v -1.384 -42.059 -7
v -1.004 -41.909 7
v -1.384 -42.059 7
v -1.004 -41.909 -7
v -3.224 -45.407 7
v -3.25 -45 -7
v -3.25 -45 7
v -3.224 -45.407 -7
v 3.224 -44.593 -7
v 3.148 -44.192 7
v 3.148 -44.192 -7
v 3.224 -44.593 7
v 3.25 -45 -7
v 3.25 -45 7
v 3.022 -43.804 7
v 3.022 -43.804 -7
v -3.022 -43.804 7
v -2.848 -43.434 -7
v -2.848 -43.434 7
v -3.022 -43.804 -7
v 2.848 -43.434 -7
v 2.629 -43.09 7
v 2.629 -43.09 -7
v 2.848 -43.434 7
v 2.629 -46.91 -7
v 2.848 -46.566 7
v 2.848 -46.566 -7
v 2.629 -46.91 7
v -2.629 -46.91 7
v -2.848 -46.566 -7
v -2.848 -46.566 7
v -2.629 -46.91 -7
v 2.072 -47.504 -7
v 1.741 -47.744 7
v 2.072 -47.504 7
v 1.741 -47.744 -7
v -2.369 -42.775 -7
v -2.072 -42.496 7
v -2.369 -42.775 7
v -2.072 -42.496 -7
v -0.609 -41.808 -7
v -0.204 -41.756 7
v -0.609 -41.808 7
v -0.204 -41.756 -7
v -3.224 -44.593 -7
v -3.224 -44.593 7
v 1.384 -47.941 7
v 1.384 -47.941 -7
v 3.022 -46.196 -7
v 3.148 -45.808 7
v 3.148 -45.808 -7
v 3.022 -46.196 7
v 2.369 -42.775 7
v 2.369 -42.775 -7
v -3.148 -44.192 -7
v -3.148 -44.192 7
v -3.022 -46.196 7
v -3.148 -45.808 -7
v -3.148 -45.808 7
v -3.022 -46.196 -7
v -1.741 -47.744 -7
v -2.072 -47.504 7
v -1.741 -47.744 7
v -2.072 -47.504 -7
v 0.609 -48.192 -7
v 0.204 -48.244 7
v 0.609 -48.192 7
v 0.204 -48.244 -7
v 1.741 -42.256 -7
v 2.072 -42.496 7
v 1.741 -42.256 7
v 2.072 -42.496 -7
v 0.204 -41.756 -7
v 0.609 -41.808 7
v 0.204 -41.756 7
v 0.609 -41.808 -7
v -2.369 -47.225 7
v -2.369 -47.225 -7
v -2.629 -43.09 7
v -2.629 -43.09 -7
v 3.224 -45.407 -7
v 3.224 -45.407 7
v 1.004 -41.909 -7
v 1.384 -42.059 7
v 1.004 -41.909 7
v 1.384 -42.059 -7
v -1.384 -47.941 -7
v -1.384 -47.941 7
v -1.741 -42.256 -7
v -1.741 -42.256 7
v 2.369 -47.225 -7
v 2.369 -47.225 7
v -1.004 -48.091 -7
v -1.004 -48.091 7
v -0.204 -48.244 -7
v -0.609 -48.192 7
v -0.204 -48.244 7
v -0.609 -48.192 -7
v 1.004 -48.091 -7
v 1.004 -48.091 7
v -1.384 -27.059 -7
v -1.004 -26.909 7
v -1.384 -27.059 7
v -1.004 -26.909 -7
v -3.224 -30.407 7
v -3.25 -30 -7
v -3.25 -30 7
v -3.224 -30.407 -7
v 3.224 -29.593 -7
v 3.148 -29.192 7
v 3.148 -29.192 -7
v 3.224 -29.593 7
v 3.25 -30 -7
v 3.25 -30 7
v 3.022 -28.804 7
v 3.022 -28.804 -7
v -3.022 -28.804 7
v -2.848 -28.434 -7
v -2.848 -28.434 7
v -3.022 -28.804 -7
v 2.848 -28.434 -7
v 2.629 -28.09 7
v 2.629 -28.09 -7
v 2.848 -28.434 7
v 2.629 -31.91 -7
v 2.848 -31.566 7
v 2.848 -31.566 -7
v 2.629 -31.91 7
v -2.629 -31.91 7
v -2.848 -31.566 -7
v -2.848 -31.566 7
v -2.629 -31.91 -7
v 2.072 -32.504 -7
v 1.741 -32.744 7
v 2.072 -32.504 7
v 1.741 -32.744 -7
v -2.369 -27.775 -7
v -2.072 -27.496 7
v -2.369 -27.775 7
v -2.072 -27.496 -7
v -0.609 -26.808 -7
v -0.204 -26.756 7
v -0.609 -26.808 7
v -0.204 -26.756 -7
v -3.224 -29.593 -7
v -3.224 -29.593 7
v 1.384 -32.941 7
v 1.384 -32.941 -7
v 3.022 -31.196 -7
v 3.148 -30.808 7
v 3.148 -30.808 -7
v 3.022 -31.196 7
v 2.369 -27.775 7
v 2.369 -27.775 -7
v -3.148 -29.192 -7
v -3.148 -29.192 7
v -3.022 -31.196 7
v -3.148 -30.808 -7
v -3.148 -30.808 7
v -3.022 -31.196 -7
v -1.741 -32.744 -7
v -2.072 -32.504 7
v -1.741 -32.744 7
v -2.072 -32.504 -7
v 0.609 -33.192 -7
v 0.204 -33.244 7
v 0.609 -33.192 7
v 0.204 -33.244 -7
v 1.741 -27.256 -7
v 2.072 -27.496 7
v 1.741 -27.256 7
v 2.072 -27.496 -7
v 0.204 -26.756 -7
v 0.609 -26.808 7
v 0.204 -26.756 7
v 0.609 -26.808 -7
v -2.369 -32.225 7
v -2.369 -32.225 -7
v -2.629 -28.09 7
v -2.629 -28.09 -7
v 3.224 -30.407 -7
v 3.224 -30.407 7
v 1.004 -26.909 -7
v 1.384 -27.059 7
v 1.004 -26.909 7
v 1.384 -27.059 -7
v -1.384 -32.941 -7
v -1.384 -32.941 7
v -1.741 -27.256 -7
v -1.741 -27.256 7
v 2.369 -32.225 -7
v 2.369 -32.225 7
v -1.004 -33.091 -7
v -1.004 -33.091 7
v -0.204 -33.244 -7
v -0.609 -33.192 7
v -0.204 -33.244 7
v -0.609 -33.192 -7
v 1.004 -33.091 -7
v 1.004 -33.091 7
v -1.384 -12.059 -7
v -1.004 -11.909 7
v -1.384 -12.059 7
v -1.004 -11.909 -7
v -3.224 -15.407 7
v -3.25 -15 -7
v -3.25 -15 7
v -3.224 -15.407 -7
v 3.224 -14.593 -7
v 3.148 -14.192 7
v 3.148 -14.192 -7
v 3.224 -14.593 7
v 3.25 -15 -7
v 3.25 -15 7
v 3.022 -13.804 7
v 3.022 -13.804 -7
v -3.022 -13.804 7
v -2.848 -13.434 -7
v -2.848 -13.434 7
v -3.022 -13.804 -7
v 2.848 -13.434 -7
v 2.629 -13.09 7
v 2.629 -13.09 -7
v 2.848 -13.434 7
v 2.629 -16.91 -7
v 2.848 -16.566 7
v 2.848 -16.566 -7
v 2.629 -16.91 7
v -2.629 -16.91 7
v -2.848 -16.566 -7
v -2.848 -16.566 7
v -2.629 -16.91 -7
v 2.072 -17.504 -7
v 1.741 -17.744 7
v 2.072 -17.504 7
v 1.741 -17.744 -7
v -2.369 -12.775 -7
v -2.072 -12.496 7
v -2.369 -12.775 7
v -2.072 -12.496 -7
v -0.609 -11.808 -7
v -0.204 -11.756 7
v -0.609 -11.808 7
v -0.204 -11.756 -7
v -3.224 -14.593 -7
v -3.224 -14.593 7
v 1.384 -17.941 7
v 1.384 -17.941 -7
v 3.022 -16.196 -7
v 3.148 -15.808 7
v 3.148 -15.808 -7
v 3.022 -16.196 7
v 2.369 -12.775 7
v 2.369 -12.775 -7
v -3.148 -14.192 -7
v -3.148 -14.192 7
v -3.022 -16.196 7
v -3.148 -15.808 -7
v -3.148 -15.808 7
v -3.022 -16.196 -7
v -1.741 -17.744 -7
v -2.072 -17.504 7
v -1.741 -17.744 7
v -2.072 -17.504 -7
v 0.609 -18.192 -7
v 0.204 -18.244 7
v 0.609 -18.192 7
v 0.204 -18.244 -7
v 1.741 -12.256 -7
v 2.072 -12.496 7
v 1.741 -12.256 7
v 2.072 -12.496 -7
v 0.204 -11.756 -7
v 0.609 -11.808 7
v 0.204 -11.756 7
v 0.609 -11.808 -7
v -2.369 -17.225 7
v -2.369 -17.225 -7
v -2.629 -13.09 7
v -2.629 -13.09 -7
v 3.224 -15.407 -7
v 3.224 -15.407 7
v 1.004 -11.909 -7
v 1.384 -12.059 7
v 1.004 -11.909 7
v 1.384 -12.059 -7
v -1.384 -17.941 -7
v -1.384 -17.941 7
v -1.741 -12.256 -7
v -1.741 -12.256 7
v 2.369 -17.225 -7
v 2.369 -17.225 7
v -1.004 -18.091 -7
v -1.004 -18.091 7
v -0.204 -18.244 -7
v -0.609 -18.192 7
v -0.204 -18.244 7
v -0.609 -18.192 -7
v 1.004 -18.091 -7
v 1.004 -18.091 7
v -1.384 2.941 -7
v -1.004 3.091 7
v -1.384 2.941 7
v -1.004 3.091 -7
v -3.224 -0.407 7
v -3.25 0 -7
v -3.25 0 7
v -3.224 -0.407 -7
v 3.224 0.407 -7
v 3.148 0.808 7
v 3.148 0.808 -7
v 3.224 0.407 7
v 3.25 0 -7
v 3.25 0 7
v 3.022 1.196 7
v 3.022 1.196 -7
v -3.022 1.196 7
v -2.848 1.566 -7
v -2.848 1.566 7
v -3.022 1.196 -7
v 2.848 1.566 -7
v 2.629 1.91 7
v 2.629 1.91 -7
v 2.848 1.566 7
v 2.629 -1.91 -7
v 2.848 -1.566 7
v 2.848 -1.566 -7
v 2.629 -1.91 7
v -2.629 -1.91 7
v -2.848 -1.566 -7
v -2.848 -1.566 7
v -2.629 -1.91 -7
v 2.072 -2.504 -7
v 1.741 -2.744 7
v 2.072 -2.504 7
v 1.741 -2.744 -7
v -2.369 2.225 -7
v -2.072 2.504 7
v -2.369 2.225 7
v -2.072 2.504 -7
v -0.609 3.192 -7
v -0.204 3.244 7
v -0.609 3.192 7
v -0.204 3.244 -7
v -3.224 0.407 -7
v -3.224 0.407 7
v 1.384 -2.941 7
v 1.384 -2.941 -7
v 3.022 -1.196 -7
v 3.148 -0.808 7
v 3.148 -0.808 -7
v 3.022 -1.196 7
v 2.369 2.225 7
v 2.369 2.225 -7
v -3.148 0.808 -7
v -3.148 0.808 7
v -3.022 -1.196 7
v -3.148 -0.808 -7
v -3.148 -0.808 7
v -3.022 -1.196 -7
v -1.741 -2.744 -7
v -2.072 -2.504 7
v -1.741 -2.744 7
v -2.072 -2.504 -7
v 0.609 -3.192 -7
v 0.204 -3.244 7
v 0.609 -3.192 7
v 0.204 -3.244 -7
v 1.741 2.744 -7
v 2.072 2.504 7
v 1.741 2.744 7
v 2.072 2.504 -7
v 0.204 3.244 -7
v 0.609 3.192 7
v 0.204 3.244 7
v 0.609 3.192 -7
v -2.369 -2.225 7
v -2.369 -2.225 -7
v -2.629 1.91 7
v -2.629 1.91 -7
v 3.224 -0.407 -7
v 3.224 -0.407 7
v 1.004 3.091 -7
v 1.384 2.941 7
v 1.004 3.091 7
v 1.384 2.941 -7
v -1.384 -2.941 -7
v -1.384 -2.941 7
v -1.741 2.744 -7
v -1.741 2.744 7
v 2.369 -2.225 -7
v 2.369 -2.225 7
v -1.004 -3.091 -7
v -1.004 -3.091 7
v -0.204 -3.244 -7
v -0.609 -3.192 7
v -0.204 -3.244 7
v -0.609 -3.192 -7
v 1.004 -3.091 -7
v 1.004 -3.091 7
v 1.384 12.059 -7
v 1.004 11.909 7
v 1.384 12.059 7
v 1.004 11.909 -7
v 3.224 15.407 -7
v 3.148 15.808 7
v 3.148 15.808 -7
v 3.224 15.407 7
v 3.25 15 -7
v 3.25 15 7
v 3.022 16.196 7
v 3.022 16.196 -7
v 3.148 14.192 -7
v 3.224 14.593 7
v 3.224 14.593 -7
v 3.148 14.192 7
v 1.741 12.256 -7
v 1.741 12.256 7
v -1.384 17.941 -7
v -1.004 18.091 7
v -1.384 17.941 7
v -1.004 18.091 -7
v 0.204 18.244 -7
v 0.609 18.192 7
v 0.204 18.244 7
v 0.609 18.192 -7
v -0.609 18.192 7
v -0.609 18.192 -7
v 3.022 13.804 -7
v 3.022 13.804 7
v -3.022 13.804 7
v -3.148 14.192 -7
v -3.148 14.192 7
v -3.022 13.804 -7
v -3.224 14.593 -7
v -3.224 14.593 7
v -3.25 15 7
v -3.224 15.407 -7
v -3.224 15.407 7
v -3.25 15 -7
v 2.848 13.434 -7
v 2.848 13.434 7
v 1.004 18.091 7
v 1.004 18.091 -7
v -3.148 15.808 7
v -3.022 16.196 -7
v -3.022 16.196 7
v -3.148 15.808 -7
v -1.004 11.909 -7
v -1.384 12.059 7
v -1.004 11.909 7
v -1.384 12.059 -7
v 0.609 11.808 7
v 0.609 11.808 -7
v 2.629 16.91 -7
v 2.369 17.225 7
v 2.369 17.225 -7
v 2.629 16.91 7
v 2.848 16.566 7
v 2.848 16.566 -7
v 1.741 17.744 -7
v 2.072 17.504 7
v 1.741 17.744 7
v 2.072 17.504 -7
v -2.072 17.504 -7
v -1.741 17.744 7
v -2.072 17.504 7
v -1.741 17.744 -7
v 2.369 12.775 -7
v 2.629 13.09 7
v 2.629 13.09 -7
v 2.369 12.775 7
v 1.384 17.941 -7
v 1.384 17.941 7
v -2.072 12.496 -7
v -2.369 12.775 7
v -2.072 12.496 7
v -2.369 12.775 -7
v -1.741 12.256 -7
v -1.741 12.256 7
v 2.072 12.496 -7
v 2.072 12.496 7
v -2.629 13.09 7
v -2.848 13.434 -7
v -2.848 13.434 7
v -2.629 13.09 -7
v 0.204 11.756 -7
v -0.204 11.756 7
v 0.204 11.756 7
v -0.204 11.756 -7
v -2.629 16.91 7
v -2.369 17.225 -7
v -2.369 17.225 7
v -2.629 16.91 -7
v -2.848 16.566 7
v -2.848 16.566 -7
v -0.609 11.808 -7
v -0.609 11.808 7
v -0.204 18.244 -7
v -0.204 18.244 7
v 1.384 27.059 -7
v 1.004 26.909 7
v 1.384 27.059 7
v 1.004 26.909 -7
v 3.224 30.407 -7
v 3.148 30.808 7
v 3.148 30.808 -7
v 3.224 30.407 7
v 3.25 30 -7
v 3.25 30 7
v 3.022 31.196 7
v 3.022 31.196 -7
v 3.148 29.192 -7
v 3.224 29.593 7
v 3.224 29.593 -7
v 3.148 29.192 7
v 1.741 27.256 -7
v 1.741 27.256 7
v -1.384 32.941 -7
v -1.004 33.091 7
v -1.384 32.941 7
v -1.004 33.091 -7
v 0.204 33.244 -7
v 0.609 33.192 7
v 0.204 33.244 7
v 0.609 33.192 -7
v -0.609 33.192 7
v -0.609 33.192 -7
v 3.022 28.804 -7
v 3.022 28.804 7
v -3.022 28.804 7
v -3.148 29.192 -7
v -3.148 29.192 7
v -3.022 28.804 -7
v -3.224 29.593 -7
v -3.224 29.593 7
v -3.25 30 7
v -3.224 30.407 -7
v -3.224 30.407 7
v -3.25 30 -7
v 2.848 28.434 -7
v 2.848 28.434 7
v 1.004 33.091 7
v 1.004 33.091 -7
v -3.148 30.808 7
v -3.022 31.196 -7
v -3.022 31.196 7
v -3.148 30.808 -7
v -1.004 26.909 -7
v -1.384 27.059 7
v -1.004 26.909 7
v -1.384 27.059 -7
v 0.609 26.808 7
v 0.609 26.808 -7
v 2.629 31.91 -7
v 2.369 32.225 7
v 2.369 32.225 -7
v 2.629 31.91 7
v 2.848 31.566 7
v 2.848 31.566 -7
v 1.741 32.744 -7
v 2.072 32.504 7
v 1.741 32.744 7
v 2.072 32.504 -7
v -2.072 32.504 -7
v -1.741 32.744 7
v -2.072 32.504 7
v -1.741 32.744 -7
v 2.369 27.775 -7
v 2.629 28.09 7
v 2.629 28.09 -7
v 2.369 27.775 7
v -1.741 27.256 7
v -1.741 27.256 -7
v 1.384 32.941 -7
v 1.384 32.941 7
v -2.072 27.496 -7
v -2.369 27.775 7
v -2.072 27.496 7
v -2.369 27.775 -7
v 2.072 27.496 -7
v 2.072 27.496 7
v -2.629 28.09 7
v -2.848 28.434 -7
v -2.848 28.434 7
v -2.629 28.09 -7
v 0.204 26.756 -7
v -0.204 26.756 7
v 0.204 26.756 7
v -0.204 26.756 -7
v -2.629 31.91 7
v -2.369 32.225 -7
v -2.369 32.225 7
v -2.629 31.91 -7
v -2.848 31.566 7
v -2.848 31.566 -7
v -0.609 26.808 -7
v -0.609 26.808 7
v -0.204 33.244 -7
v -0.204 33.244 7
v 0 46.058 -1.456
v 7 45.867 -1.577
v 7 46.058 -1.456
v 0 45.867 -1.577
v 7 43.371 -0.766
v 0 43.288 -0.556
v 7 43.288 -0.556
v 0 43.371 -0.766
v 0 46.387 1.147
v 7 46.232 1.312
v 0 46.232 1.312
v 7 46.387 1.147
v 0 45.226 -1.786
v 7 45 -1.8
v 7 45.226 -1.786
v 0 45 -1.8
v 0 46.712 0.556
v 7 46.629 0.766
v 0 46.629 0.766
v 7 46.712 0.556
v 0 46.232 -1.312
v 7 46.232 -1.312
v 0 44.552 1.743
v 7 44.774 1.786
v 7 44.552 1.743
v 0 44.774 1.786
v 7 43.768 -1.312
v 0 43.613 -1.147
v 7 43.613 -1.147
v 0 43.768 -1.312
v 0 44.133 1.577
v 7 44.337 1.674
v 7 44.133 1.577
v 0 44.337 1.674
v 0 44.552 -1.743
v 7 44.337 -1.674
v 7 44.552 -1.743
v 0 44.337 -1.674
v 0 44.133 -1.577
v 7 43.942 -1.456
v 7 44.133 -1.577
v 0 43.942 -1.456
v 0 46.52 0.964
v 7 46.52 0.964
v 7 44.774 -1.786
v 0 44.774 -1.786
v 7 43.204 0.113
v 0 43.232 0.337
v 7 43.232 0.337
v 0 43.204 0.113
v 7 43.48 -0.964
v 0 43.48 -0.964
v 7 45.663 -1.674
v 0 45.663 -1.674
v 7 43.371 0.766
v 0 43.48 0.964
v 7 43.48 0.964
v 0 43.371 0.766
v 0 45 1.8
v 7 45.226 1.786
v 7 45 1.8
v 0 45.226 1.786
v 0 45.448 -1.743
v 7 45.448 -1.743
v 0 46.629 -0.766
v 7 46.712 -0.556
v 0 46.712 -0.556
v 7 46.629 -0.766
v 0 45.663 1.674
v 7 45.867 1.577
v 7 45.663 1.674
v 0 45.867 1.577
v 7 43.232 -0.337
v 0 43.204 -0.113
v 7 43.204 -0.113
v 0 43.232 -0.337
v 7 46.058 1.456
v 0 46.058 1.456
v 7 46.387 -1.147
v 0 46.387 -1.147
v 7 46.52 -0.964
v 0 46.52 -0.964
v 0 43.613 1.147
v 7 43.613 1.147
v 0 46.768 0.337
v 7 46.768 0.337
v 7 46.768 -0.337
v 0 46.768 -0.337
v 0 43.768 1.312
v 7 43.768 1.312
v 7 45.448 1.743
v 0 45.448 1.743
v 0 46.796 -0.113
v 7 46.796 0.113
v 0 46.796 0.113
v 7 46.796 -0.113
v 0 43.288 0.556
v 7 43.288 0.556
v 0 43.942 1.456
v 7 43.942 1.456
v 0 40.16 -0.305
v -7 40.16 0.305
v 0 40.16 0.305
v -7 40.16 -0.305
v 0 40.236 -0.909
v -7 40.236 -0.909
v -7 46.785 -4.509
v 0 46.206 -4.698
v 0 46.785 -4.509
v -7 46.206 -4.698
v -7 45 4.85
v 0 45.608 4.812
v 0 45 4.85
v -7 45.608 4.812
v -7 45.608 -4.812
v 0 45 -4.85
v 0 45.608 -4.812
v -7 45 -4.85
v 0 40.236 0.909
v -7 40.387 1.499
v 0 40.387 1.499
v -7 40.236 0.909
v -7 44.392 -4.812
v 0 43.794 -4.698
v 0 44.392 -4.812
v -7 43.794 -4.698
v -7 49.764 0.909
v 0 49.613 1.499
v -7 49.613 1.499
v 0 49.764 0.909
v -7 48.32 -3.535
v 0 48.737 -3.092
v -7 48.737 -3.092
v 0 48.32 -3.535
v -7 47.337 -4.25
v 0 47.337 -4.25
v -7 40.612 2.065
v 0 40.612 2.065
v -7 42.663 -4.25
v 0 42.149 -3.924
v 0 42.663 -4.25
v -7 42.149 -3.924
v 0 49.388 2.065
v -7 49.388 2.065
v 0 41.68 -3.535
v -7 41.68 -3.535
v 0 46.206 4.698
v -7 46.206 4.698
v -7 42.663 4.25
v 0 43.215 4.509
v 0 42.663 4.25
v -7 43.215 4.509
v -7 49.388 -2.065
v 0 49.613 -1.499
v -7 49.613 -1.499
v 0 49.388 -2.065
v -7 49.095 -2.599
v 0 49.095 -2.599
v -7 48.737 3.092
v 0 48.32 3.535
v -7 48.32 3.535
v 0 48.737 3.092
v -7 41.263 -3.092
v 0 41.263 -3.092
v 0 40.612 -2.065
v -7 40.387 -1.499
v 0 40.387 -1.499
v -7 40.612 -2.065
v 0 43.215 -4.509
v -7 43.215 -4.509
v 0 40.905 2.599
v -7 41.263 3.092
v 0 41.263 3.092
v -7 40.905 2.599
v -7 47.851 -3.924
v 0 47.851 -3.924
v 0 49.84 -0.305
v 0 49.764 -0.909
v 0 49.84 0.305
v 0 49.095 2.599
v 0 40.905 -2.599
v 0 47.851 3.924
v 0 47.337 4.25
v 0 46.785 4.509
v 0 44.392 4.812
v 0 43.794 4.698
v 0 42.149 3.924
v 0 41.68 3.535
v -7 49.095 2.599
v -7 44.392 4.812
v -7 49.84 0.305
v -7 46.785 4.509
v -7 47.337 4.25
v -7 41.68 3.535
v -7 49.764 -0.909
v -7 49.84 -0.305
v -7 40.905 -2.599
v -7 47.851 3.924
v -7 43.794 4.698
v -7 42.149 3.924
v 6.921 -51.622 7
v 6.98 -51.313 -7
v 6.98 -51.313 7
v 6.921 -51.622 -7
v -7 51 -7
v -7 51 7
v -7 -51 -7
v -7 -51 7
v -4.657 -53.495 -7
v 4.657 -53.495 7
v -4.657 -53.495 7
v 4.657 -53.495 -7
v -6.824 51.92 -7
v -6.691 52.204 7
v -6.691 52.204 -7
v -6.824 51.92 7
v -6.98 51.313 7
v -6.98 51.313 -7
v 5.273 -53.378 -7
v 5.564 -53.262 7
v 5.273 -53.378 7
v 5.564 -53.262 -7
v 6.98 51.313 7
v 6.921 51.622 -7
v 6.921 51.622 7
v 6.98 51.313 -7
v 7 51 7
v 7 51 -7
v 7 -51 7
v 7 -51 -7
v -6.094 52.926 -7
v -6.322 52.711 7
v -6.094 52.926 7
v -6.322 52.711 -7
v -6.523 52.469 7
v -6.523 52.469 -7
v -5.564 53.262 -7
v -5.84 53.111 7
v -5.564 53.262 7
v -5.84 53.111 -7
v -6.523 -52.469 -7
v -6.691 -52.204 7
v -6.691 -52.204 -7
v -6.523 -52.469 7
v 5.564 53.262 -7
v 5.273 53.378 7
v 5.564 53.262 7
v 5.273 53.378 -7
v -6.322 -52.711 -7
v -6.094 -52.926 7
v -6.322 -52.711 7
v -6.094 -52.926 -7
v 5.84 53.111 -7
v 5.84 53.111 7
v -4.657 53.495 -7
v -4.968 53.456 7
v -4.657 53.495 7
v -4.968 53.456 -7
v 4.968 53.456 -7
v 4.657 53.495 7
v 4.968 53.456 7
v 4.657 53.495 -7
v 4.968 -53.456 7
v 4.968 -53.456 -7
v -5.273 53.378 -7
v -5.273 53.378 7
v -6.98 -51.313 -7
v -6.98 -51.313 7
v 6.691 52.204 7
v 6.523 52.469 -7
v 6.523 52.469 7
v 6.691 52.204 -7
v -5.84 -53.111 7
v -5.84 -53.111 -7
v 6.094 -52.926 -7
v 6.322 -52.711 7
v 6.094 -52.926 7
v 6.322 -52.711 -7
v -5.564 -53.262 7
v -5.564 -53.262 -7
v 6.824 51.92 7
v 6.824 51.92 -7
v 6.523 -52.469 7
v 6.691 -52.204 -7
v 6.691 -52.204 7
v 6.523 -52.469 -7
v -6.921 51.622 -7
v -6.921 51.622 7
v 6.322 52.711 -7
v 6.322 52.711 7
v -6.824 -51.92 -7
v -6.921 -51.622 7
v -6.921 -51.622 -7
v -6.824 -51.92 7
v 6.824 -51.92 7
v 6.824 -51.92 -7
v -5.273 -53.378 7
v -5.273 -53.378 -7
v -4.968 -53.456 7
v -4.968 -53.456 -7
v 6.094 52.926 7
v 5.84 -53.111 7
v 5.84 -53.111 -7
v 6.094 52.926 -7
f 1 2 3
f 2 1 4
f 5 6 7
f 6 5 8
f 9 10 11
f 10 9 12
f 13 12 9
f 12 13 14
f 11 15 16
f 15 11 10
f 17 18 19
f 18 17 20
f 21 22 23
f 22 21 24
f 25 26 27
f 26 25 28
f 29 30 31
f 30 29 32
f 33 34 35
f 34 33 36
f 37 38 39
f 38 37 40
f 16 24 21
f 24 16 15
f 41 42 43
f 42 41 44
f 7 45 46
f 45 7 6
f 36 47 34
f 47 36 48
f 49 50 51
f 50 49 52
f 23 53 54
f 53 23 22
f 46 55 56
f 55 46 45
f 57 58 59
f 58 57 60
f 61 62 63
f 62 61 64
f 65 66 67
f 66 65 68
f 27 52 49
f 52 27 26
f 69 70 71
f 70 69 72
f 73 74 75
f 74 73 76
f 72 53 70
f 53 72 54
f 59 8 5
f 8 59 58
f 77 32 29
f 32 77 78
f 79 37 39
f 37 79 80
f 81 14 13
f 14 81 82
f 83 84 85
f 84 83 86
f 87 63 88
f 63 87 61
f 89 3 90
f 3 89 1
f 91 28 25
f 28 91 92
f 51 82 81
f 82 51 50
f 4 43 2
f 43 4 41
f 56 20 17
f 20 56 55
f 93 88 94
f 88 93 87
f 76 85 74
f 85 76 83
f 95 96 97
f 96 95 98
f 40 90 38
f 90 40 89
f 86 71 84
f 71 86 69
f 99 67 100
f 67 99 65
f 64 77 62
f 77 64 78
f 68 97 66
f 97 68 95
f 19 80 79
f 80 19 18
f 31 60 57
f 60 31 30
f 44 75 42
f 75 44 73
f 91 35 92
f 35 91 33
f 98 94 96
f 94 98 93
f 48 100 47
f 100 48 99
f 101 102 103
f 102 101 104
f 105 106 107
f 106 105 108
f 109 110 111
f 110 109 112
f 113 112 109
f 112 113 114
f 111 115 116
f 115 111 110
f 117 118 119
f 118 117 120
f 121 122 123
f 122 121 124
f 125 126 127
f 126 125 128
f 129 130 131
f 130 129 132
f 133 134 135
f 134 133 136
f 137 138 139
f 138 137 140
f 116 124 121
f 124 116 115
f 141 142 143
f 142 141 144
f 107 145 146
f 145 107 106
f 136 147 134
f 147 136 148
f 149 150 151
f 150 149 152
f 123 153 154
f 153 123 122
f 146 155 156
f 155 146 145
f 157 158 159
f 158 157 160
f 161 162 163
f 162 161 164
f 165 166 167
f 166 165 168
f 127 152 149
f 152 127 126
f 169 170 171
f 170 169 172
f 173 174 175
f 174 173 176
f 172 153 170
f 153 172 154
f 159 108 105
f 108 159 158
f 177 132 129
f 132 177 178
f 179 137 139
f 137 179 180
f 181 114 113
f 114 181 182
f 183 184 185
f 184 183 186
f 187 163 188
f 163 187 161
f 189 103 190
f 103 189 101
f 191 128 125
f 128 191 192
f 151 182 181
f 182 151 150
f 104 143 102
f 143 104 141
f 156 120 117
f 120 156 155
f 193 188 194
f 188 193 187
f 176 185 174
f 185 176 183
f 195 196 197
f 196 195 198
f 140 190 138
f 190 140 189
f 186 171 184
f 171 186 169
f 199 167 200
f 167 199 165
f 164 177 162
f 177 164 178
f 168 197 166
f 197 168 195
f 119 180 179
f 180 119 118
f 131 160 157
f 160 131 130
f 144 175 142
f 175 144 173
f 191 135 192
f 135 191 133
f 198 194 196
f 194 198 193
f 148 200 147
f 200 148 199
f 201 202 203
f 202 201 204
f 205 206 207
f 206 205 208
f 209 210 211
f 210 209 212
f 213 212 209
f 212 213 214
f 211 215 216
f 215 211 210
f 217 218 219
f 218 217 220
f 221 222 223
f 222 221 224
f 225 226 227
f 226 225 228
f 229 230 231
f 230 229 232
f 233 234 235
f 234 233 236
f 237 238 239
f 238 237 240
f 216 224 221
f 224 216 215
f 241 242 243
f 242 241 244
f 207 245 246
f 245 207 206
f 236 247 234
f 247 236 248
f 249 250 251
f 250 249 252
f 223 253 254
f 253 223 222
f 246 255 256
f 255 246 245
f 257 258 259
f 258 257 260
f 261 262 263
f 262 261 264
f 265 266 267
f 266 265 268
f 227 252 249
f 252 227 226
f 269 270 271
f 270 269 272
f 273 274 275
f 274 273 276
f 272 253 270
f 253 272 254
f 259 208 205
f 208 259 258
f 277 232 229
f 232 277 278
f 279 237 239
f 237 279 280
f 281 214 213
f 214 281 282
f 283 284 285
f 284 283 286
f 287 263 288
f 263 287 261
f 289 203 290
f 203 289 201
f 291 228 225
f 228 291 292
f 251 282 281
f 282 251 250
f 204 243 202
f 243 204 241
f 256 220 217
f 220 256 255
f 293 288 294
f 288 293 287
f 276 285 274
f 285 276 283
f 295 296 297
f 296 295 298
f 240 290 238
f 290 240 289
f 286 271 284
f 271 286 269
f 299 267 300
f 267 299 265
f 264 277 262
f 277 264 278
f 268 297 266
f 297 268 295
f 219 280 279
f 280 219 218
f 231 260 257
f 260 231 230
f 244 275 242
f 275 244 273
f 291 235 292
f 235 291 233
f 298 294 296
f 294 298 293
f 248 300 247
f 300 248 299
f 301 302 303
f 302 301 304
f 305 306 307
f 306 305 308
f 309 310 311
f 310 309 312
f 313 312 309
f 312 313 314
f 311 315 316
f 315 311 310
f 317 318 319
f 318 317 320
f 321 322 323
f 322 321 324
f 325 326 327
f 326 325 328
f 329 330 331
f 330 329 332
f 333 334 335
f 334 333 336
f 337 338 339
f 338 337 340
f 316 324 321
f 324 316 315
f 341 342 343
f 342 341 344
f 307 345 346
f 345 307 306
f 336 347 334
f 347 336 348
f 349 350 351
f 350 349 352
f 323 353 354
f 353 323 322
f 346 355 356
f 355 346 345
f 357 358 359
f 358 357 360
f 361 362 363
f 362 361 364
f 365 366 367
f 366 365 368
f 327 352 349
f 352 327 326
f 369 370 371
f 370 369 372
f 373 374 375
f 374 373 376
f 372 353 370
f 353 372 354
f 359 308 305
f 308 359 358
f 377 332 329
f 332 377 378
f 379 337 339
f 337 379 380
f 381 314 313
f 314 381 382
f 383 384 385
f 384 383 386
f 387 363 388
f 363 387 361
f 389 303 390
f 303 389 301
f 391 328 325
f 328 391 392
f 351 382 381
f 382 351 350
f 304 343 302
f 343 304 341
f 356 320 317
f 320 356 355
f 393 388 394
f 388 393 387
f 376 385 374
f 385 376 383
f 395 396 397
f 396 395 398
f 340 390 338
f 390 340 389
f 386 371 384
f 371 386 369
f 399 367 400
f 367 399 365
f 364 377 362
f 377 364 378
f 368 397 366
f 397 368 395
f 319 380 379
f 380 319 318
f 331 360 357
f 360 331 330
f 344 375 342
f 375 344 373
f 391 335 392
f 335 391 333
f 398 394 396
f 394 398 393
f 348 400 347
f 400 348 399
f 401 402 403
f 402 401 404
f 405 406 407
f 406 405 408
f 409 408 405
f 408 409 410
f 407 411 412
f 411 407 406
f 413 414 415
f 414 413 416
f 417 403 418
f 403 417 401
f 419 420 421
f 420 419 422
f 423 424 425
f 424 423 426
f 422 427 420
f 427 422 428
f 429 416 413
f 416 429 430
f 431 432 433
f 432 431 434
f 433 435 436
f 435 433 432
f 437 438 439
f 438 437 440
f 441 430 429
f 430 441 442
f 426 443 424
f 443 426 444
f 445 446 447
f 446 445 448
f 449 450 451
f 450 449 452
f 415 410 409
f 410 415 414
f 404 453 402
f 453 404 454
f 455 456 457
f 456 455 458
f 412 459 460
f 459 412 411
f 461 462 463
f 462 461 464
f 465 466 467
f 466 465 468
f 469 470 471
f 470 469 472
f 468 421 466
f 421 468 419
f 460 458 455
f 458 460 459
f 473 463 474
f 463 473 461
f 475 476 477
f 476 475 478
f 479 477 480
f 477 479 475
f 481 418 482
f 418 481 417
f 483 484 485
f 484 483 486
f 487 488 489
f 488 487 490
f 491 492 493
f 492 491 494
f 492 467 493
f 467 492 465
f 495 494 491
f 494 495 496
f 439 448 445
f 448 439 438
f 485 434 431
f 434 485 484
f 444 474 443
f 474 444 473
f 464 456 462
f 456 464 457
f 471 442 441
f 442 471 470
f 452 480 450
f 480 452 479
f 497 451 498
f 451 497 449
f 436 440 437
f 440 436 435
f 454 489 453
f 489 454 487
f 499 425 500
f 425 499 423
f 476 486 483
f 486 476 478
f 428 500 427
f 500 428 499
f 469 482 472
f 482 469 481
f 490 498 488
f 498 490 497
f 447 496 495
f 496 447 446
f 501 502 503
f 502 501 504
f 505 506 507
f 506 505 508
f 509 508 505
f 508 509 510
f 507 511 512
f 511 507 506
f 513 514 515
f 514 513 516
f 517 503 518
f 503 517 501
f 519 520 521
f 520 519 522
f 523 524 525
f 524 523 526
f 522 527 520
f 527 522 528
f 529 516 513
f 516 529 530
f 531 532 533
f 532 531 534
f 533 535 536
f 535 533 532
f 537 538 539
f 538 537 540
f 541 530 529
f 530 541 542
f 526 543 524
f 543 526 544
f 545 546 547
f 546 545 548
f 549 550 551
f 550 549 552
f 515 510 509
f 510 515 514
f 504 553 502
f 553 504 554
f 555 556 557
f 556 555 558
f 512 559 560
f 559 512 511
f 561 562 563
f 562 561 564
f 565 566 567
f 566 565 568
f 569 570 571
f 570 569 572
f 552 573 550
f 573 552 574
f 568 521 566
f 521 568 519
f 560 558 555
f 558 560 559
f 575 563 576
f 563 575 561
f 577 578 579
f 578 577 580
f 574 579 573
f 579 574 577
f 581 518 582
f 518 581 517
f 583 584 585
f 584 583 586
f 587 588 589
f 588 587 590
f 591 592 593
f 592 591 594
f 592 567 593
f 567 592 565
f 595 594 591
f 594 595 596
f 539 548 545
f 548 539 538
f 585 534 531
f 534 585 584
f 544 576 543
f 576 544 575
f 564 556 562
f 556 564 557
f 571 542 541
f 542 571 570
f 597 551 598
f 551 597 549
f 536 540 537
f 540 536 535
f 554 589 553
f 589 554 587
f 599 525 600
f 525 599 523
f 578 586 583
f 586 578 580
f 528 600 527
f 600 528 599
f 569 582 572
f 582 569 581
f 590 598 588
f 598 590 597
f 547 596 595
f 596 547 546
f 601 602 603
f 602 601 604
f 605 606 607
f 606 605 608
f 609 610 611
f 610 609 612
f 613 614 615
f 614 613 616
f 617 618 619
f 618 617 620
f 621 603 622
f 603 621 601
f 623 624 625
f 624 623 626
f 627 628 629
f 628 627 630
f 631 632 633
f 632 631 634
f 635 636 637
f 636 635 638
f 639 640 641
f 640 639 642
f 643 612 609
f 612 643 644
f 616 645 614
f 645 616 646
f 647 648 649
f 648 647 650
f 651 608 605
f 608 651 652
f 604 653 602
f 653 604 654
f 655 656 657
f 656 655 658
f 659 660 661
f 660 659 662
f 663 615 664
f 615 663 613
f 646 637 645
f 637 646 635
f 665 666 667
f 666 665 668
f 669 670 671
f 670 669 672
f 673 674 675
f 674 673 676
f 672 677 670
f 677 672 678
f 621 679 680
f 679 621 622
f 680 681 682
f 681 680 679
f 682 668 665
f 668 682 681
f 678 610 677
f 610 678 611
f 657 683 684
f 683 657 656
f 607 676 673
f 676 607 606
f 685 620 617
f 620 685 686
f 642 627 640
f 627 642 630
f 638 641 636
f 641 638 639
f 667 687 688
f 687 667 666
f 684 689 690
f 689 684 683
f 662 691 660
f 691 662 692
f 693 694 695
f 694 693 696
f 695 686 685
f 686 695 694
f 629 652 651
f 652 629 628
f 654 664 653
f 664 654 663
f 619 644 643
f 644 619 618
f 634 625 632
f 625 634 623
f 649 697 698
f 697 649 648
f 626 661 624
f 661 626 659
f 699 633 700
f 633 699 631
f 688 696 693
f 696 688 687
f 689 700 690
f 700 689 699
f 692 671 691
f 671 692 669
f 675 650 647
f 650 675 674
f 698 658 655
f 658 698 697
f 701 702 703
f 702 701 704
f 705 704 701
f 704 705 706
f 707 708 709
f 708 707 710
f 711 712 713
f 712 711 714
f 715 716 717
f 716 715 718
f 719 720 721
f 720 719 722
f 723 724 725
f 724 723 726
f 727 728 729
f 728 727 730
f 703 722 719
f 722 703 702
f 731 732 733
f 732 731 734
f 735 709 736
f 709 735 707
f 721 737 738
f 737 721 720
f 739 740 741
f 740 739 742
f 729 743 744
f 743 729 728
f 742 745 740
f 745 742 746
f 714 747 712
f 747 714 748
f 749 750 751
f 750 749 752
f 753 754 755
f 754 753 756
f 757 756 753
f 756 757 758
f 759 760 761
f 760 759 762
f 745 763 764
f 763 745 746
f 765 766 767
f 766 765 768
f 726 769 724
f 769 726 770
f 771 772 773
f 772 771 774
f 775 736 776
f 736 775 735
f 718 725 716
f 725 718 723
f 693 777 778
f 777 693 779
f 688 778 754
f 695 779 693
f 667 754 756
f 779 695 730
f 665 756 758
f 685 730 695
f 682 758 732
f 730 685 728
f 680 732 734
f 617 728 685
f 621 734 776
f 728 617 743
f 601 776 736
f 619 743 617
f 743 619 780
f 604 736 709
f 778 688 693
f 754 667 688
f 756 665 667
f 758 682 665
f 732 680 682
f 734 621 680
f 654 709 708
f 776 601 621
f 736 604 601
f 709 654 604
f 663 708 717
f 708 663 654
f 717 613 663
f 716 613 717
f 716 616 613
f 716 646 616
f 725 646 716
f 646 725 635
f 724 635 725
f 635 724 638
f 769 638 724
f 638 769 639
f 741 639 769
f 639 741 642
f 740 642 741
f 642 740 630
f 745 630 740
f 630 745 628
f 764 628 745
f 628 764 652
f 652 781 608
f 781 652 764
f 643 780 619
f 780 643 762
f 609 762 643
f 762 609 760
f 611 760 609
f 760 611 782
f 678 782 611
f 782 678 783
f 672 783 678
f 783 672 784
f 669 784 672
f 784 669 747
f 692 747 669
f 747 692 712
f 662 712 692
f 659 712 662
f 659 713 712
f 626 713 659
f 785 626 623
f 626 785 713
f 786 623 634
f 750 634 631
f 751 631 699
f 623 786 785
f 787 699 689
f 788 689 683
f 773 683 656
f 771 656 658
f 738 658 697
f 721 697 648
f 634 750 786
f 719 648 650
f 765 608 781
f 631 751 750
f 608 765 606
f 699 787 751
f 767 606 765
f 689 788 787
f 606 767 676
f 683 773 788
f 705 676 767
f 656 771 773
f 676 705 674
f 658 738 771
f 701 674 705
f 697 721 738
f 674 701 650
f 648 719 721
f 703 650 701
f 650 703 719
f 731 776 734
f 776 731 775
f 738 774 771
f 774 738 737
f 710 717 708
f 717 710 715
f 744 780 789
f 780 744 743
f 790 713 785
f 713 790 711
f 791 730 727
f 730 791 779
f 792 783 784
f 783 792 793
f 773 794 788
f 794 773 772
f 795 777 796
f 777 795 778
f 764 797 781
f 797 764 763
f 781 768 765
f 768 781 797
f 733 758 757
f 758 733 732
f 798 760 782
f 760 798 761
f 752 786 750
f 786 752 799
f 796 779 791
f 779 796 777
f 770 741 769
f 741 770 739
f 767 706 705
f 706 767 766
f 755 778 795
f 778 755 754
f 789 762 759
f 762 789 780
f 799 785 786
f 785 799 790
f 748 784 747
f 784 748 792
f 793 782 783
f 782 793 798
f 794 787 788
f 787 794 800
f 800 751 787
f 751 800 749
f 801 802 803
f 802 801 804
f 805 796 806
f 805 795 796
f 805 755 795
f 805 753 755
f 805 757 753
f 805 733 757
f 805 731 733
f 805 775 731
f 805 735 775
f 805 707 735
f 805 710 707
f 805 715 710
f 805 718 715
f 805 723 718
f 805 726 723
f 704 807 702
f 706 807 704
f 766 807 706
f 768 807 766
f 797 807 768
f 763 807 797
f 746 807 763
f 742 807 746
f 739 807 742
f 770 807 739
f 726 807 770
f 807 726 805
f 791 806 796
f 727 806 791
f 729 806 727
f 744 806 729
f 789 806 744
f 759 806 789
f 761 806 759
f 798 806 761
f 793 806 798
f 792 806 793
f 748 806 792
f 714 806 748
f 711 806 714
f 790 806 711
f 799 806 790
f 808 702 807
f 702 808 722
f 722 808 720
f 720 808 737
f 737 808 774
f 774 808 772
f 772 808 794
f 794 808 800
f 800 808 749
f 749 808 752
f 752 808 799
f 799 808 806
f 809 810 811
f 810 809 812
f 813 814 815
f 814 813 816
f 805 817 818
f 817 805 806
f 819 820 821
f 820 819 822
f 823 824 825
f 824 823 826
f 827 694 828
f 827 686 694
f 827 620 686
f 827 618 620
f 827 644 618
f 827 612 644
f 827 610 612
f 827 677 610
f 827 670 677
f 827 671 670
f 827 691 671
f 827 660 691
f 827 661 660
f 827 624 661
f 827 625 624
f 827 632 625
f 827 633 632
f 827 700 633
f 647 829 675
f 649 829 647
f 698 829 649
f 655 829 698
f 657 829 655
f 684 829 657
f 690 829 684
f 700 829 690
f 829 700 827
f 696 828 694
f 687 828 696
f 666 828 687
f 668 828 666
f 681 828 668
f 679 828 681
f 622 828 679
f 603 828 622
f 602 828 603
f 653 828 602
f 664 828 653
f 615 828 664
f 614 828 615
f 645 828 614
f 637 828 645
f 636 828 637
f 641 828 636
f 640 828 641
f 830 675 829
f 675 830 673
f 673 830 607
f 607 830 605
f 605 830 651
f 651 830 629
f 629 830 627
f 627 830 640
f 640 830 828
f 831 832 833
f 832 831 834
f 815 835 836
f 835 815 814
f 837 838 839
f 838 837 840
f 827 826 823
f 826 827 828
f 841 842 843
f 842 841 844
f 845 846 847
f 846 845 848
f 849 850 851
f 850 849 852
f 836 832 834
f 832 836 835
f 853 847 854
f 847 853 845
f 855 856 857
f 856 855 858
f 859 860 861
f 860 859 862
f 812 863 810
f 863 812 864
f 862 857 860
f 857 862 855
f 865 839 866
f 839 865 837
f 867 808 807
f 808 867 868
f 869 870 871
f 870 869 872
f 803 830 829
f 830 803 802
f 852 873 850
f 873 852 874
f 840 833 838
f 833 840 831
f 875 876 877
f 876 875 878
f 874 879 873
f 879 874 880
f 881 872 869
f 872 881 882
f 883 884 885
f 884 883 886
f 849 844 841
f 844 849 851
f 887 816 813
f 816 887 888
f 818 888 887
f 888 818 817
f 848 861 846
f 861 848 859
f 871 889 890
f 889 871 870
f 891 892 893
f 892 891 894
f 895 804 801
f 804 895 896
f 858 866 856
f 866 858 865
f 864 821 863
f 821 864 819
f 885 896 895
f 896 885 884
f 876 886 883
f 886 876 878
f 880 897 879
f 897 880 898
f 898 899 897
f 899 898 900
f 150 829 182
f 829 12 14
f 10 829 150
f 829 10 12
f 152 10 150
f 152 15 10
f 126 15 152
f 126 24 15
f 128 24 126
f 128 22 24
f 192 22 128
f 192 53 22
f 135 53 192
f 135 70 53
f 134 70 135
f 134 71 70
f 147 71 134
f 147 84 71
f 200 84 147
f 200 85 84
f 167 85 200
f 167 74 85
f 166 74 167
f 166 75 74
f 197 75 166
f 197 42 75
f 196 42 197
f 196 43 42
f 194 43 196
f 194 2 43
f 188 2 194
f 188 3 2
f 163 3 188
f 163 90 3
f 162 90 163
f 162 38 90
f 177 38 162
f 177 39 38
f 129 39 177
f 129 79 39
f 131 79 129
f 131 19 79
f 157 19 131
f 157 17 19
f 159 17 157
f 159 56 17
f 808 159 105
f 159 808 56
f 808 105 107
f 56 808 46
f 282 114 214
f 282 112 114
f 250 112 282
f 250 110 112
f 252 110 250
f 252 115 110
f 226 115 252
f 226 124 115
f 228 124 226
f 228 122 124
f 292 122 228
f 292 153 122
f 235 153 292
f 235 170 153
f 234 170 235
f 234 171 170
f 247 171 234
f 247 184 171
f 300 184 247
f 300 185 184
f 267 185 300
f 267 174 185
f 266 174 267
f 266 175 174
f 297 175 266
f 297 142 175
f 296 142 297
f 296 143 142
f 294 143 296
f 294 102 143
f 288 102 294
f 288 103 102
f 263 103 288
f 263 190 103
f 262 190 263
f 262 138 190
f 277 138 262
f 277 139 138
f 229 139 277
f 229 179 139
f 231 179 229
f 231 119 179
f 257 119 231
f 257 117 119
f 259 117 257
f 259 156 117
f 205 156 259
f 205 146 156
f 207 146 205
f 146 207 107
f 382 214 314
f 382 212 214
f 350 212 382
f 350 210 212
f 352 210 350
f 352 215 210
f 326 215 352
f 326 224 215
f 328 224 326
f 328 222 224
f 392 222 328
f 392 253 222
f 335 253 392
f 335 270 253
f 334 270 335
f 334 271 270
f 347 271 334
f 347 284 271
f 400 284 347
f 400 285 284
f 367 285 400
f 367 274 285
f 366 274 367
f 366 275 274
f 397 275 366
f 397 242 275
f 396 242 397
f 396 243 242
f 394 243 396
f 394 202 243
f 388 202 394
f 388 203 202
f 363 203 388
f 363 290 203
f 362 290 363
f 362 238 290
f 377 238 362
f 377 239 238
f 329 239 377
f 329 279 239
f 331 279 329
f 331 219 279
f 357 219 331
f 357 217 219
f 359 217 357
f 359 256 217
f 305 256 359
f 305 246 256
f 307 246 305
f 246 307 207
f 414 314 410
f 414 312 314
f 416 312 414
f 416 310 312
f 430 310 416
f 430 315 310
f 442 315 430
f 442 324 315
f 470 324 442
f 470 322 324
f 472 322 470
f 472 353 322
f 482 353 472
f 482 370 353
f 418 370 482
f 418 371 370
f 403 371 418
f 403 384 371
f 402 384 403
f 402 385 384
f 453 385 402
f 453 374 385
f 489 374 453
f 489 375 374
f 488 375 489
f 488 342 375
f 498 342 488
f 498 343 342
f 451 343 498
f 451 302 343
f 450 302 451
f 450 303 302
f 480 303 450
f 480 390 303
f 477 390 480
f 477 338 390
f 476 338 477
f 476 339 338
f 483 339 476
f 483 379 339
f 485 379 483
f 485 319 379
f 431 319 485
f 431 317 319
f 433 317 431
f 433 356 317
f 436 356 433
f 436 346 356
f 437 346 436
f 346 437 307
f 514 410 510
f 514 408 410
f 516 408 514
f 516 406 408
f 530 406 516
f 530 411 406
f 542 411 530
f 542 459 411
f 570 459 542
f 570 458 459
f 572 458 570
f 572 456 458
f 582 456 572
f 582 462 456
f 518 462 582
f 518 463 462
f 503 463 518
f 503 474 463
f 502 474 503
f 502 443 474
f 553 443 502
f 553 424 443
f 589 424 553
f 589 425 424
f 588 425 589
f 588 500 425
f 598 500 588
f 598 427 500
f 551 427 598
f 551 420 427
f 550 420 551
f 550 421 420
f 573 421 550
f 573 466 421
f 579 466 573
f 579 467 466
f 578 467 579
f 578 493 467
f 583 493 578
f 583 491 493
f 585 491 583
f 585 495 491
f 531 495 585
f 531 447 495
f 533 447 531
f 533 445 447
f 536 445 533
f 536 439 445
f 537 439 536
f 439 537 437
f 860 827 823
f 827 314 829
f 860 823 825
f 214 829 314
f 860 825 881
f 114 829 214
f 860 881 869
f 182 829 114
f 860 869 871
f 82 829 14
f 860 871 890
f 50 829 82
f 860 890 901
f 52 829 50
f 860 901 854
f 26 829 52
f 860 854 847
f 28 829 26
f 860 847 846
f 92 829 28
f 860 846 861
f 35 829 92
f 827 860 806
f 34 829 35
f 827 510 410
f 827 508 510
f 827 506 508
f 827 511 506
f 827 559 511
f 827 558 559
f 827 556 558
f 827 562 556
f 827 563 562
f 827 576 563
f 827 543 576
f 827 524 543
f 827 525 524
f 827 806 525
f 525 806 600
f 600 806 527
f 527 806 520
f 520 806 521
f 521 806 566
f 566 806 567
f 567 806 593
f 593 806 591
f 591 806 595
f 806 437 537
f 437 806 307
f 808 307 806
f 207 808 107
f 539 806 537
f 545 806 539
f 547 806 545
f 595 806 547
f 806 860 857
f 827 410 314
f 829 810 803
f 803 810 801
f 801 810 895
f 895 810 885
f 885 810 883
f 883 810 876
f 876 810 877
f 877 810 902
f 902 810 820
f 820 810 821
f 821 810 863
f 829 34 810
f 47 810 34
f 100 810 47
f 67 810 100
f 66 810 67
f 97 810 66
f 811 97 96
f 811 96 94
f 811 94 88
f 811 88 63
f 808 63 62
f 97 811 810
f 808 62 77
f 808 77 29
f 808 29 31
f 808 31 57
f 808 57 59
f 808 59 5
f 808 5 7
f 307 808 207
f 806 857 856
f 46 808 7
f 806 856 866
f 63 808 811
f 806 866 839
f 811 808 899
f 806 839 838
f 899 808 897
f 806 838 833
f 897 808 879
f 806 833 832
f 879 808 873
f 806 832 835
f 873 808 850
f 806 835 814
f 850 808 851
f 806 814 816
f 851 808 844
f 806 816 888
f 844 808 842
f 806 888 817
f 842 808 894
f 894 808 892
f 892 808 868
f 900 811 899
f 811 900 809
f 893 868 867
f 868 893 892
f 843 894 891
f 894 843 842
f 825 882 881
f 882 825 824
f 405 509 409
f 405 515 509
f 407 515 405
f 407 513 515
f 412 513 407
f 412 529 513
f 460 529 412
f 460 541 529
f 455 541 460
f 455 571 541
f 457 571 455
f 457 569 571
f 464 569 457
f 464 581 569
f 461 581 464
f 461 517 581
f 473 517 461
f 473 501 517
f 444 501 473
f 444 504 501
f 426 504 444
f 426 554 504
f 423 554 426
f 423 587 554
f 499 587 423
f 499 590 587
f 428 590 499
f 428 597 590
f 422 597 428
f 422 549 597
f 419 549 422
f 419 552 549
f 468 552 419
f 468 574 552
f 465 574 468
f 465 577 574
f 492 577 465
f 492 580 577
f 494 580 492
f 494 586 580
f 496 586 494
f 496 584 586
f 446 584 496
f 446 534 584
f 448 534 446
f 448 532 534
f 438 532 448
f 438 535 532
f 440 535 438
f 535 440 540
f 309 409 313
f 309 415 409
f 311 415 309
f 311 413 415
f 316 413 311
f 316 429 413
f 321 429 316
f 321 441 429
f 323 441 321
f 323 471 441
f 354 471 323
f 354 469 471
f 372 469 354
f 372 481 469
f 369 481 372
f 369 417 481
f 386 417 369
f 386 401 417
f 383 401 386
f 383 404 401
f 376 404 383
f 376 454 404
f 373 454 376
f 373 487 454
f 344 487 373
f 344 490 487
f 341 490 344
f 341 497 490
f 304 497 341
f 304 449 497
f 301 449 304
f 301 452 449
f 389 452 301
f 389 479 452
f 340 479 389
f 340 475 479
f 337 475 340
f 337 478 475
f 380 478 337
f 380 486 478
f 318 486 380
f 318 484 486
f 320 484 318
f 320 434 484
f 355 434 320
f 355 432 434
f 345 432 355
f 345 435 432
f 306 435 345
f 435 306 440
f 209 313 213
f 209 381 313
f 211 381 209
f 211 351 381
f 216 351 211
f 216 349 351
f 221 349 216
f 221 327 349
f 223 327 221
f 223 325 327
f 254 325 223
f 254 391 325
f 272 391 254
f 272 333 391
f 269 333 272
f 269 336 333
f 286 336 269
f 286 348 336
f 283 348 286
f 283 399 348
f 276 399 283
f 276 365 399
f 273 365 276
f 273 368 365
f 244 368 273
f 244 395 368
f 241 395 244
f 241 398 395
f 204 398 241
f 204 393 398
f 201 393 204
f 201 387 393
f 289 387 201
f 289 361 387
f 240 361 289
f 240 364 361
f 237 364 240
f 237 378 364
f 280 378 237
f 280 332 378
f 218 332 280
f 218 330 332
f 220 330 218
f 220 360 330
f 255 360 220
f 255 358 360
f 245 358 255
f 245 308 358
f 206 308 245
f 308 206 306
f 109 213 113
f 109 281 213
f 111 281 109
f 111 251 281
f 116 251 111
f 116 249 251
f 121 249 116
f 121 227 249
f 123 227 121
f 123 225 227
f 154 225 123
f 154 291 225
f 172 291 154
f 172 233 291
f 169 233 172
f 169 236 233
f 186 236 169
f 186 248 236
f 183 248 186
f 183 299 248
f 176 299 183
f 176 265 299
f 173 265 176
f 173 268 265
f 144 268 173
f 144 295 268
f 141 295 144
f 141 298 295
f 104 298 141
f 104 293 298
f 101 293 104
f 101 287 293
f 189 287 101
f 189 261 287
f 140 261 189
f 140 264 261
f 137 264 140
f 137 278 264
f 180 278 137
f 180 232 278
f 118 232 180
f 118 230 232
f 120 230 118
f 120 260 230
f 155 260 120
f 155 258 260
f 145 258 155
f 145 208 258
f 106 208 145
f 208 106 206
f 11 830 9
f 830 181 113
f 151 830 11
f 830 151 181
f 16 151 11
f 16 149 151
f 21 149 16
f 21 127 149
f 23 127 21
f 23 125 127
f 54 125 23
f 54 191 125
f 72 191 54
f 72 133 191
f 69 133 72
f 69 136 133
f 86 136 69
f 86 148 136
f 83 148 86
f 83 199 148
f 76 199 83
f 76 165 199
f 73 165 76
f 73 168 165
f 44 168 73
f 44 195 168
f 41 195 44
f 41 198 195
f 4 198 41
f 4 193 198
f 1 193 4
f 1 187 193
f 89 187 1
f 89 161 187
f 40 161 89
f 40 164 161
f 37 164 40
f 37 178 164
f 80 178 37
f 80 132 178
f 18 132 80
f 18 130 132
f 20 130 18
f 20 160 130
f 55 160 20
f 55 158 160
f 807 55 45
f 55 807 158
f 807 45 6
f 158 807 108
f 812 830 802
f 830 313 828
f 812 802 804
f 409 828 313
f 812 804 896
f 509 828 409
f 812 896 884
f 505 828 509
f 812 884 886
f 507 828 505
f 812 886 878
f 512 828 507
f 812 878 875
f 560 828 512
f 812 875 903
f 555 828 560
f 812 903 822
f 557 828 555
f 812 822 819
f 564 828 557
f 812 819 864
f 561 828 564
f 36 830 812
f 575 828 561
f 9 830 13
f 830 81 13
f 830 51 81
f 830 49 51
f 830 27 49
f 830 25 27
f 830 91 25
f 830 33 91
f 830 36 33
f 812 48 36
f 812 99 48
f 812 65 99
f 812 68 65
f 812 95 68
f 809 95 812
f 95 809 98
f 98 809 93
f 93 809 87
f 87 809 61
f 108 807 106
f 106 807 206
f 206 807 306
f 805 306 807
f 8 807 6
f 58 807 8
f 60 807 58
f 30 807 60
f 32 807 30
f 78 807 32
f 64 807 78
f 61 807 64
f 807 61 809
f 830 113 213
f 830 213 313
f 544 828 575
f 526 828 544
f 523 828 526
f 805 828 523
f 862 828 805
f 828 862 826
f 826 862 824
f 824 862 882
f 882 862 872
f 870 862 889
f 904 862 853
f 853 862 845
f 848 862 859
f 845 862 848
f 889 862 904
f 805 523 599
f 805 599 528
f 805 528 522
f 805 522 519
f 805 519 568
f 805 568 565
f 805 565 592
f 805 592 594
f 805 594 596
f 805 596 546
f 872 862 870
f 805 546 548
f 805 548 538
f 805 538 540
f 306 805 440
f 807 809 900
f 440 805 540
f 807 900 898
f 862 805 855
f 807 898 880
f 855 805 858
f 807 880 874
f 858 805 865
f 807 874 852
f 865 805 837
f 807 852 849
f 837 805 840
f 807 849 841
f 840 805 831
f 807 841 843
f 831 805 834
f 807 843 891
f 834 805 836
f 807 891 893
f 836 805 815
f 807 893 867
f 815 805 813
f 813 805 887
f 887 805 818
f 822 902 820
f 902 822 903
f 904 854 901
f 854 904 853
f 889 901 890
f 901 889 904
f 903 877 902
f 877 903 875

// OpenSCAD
$fn = 50;


difference() {
	union() {
		translate(v = [0, 0, -7.0000000000]) {
			hull() {
				translate(v = [-4.5000000000, 51.0000000000, 0]) {
					cylinder(h = 14, r = 2.5000000000);
				}
				translate(v = [4.5000000000, 51.0000000000, 0]) {
					cylinder(h = 14, r = 2.5000000000);
				}
				translate(v = [-4.5000000000, -51.0000000000, 0]) {
					cylinder(h = 14, r = 2.5000000000);
				}
				translate(v = [4.5000000000, -51.0000000000, 0]) {
					cylinder(h = 14, r = 2.5000000000);
				}
			}
		}
	}
	union() {
		translate(v = [0.0000000000, -45.0000000000, -50.0000000000]) {
			cylinder(h = 100, r = 3.2500000000);
		}
		translate(v = [0.0000000000, -30.0000000000, -50.0000000000]) {
			cylinder(h = 100, r = 3.2500000000);
		}
		translate(v = [0.0000000000, -15.0000000000, -50.0000000000]) {
			cylinder(h = 100, r = 3.2500000000);
		}
		translate(v = [0.0000000000, 0.0000000000, -50.0000000000]) {
			cylinder(h = 100, r = 3.2500000000);
		}
		translate(v = [0.0000000000, 15.0000000000, -50.0000000000]) {
			cylinder(h = 100, r = 3.2500000000);
		}
		translate(v = [0.0000000000, 30.0000000000, -50.0000000000]) {
			cylinder(h = 100, r = 3.2500000000);
		}
		translate(v = [-50, 45, 0]) {
			rotate(a = [0, 90, 0]) {
				cylinder(h = 100, r = 1.8000000000);
			}
		}
		translate(v = [-100, 45, 0]) {
			rotate(a = [0, 90, 0]) {
				cylinder(h = 100, r = 4.8500000000);
			}
		}
	}
}
